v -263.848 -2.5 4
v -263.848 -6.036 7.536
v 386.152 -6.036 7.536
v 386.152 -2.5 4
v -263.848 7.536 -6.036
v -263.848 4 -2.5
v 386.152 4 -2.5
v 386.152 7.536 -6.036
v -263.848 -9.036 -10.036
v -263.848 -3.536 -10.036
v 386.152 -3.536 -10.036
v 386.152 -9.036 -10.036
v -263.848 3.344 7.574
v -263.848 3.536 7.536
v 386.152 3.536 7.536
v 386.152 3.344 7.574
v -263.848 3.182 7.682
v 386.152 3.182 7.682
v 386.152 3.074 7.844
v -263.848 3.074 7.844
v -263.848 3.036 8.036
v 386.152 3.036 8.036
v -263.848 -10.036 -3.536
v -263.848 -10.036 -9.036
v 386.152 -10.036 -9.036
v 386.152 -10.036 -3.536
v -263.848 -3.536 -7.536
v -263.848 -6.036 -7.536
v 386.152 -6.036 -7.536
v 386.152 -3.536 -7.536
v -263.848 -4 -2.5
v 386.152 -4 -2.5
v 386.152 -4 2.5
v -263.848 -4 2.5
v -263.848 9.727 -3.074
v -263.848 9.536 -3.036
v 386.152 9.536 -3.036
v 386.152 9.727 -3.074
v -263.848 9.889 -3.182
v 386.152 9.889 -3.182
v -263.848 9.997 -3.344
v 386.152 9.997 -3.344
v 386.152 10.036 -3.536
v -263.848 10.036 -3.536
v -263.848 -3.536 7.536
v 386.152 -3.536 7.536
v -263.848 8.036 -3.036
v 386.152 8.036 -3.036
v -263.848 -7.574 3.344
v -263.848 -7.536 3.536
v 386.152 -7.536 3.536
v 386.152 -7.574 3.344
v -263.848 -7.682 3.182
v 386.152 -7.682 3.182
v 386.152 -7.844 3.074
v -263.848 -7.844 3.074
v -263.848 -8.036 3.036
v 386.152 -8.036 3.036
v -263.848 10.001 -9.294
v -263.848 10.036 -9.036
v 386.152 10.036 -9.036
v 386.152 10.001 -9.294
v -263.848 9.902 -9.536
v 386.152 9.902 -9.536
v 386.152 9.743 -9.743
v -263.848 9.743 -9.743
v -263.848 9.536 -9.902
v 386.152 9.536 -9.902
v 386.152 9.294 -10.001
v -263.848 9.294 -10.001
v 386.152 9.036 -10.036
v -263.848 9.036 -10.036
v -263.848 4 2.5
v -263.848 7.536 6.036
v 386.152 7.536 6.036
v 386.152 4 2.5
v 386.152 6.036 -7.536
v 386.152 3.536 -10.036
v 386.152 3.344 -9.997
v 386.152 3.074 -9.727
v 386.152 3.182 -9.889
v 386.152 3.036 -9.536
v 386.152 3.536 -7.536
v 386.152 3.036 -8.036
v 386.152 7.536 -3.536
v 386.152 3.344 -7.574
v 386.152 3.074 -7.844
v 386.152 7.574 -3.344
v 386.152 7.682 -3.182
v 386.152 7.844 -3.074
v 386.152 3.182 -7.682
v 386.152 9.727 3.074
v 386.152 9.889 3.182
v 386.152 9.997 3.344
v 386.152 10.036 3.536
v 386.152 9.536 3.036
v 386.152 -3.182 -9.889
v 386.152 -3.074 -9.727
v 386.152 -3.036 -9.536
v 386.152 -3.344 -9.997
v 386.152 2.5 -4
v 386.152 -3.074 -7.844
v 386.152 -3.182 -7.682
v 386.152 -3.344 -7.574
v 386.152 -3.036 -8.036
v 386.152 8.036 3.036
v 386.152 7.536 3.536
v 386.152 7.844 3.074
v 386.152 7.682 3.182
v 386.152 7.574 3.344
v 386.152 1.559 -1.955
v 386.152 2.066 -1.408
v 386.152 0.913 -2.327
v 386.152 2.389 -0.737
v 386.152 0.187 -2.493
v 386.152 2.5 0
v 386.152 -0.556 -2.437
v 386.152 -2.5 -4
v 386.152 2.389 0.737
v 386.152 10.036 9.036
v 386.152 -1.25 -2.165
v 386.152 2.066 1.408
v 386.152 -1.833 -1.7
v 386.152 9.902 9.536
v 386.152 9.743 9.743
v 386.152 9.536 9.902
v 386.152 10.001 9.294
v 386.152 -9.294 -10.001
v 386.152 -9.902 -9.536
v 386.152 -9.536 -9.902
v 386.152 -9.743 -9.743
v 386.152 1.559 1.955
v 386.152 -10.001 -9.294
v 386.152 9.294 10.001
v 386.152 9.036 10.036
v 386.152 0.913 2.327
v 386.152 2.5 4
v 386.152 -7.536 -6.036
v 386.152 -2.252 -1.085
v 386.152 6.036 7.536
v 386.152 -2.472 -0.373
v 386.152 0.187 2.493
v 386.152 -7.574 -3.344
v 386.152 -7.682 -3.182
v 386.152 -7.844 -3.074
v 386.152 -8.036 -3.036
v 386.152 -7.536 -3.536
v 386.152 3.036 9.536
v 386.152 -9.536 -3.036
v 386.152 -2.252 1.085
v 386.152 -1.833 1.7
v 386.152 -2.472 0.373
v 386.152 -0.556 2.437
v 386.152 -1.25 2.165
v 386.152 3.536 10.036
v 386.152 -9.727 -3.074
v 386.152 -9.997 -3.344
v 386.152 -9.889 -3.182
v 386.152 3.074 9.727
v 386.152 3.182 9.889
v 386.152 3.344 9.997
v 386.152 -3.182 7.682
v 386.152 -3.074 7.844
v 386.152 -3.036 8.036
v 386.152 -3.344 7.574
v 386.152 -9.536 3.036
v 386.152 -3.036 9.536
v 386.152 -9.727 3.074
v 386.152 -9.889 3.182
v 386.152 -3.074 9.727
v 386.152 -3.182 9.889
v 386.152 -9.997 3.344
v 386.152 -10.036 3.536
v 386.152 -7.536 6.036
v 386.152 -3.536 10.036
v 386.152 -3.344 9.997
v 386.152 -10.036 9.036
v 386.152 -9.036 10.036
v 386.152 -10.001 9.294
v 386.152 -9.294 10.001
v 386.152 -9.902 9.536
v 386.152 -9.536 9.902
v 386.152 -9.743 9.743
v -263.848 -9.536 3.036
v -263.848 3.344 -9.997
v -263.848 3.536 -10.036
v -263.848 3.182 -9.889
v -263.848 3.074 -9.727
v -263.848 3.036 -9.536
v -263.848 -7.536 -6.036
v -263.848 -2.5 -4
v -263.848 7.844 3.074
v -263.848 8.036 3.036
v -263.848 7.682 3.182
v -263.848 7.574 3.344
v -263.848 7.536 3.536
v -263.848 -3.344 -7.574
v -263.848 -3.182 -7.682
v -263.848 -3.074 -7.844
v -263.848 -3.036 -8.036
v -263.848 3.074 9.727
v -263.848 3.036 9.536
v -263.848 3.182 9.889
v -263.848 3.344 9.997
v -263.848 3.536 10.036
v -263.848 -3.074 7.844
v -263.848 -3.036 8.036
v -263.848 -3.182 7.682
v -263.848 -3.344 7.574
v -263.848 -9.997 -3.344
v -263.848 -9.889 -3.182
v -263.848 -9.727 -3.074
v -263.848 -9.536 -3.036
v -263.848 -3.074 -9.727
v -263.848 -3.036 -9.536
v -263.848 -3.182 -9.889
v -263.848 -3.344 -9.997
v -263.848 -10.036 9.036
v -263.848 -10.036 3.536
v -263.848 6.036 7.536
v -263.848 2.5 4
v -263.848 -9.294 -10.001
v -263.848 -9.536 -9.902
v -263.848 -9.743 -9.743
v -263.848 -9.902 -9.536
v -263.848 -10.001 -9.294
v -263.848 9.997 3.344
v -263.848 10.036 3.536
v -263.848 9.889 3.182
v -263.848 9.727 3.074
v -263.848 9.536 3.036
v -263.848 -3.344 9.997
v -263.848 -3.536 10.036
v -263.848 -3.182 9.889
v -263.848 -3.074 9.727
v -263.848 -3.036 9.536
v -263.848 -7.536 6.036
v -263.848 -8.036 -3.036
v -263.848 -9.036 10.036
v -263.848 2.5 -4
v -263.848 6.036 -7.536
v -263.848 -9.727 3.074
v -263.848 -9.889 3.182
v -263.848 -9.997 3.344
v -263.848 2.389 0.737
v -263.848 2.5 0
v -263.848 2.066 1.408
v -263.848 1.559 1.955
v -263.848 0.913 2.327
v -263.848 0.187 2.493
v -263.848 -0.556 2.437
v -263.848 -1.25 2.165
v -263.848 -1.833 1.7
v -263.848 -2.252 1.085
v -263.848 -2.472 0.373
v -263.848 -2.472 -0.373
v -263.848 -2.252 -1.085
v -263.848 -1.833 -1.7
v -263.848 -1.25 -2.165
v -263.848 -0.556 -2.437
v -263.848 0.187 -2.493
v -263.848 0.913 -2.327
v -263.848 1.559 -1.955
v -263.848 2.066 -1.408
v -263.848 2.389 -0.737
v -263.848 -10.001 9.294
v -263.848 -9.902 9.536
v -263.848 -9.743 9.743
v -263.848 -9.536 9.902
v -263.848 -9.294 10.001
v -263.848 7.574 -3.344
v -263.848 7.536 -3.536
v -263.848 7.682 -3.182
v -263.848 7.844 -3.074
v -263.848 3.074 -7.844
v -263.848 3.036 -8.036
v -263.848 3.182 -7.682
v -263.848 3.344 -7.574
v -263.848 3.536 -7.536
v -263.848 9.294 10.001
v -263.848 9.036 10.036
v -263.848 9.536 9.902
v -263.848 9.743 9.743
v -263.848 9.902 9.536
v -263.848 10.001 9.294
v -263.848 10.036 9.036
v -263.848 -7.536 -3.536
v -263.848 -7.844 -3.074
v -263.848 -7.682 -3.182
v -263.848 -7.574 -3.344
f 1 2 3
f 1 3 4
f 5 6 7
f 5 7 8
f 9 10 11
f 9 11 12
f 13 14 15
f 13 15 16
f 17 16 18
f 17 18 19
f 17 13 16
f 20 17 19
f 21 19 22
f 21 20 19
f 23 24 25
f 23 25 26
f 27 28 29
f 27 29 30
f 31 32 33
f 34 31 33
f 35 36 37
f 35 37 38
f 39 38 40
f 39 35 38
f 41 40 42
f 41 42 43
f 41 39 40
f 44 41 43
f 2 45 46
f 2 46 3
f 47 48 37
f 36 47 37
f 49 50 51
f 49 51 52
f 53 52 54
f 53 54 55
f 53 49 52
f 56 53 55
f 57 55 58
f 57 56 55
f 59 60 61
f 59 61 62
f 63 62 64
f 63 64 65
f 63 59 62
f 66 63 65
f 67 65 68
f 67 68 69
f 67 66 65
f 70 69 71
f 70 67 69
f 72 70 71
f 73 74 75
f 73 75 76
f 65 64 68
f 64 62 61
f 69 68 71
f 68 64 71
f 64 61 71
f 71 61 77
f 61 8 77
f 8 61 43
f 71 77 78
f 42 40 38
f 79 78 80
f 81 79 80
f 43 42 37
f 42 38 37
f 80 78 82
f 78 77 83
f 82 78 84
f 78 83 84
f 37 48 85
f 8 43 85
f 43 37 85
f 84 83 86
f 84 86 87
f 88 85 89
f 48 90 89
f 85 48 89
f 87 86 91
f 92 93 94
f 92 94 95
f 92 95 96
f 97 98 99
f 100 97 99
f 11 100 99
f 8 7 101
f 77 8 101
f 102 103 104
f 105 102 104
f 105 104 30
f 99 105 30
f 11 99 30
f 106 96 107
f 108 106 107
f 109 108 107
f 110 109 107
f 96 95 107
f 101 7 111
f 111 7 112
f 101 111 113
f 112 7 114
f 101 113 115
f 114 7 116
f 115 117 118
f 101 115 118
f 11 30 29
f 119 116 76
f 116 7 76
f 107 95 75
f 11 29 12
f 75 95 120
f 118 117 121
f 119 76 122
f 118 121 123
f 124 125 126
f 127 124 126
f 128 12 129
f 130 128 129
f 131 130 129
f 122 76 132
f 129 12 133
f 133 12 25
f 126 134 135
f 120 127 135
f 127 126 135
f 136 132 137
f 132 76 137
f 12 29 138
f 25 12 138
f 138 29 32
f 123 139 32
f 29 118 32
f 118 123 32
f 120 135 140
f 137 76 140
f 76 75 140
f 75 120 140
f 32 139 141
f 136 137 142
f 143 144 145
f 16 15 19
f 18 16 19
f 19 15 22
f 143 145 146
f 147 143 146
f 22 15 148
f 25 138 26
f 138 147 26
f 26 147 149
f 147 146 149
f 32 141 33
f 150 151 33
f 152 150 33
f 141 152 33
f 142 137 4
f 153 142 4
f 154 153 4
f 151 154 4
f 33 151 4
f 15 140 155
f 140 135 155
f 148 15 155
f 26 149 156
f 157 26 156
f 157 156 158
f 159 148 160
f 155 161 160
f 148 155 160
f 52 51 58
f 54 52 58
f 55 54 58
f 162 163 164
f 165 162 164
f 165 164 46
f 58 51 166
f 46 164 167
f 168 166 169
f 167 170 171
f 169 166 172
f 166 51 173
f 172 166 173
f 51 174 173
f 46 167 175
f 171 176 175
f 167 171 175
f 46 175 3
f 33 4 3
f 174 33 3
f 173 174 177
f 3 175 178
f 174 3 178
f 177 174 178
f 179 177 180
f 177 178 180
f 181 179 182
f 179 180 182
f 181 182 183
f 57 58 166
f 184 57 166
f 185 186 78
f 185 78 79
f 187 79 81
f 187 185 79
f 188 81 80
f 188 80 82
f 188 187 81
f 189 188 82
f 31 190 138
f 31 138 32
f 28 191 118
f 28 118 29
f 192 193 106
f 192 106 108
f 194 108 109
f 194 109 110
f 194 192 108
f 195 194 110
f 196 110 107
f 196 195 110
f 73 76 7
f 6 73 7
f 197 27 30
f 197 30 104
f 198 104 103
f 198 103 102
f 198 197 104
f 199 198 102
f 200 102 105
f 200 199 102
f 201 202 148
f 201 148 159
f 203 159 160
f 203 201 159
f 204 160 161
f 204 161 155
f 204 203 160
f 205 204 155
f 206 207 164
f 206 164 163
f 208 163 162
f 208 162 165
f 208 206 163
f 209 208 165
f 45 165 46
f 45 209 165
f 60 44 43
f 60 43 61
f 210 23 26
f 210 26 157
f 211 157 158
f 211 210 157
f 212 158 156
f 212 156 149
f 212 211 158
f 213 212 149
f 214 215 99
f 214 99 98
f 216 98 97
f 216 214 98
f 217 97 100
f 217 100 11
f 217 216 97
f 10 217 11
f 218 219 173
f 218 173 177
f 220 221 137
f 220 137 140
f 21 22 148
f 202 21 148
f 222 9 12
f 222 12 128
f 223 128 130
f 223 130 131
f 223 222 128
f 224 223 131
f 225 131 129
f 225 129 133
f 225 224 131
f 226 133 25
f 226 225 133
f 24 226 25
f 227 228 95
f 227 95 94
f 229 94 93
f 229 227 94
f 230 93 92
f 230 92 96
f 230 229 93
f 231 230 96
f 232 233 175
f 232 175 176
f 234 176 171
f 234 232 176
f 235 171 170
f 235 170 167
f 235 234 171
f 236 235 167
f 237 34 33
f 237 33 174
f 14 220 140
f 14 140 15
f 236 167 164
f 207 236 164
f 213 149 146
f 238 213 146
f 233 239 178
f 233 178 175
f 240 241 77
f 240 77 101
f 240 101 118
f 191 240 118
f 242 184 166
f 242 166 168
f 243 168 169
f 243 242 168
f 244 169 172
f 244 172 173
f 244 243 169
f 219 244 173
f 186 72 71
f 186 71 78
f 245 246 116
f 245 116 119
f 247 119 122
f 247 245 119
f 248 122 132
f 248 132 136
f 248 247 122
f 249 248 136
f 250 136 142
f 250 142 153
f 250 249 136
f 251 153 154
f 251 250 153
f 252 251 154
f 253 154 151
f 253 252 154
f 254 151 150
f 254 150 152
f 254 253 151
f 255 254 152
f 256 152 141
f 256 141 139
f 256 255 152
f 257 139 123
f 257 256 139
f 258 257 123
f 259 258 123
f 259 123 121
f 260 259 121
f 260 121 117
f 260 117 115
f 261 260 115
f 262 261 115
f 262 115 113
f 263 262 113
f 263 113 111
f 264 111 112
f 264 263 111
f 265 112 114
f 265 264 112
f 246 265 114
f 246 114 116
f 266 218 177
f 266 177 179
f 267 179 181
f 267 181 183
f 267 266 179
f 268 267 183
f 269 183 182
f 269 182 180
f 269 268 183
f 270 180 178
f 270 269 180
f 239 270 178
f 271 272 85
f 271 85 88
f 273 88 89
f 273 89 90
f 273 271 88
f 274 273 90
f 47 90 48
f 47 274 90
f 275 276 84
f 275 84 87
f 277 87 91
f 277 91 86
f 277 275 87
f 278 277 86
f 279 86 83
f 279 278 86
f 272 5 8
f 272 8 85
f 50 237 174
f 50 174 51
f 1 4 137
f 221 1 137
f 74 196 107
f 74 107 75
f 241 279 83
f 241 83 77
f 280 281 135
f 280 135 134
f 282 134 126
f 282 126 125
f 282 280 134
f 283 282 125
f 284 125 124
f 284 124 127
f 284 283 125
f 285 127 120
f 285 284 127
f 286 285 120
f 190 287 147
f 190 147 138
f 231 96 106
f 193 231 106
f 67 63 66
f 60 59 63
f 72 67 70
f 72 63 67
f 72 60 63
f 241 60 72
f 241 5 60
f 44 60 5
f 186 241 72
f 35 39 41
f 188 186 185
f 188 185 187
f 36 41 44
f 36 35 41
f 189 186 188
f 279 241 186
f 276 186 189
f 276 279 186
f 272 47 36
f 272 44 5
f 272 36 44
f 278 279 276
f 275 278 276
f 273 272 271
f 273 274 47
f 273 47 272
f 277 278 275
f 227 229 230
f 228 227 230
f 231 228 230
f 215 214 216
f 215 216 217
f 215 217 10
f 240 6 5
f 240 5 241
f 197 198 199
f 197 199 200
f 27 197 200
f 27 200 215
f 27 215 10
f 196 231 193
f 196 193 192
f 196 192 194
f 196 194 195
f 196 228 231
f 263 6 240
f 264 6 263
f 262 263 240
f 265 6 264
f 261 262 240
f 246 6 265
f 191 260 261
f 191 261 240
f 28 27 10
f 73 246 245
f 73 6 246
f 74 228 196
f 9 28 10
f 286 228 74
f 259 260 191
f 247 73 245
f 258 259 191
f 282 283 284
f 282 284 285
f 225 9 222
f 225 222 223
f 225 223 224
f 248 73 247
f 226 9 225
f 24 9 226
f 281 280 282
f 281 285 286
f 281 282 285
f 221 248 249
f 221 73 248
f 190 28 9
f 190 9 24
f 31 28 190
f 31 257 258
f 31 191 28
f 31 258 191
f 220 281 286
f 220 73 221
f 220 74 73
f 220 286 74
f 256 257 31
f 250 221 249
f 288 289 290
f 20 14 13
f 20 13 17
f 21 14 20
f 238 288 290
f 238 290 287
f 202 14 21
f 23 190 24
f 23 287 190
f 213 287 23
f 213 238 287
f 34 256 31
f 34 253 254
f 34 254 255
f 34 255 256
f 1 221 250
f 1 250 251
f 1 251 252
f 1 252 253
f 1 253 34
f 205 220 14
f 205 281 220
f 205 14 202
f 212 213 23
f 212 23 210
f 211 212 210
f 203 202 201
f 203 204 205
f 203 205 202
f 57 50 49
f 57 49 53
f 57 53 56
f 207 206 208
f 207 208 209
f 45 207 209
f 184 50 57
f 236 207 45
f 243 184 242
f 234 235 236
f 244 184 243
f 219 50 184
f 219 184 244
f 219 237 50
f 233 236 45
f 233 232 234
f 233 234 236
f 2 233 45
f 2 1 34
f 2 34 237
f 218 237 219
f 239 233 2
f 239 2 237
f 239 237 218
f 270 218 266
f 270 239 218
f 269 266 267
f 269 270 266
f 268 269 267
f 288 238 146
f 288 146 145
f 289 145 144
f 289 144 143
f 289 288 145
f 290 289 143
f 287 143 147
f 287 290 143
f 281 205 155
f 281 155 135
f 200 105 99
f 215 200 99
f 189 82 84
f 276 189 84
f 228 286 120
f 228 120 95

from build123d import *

# Parameters (mm, degrees)
SKETCH11_R                            = 2.5
ALUMINIUM_PROF_ALUMINIUM_PROF_1_DEPTH = 650


with BuildPart() as part:
    # Sketch11 → Aluminium prof ALUMINIUM PROF(1) (new body)
    with BuildSketch(Plane.YZ.offset(-263.847780127)):
        with BuildLine():
            Line((-2.5, 4), (2.5, 4))
            Line((2.5, 4), (6.035533906, 7.535533906))
            Line((6.035533906, 7.535533906), (3.535533906, 7.535533906))
            ThreePointArc((3.535533906, 7.535533906), (3.181980515, 7.681980515), (3.035533906, 8.035533906))
            Line((3.035533906, 8.035533906), (3.035533906, 9.535533906))
            ThreePointArc((3.035533906, 9.535533906), (3.181980515, 9.889087297), (3.535533906, 10.035533906))
            Line((3.535533906, 10.035533906), (9.035533906, 10.035533906))
            ThreePointArc((9.035533906, 10.035533906), (9.742640687, 9.742640687), (10.035533906, 9.035533906))
            Line((10.035533906, 9.035533906), (10.035533906, 3.535533906))
            ThreePointArc((10.035533906, 3.535533906), (9.889087297, 3.181980515), (9.535533906, 3.035533906))
            Line((9.535533906, 3.035533906), (8.035533906, 3.035533906))
            ThreePointArc((8.035533906, 3.035533906), (7.681980515, 3.181980515), (7.535533906, 3.535533906))
            Line((7.535533906, 3.535533906), (7.535533906, 6.035533906))
            Line((7.535533906, 6.035533906), (4, 2.5))
            Line((4, 2.5), (4, -2.5))
            Line((4, -2.5), (7.535533906, -6.035533906))
            Line((7.535533906, -6.035533906), (7.535533906, -3.535533906))
            ThreePointArc((7.535533906, -3.535533906), (7.681980515, -3.181980515), (8.035533906, -3.035533906))
            Line((8.035533906, -3.035533906), (9.535533906, -3.035533906))
            ThreePointArc((9.535533906, -3.035533906), (9.889087297, -3.181980515), (10.035533906, -3.535533906))
            Line((10.035533906, -3.535533906), (10.035533906, -9.035533906))
            ThreePointArc((10.035533906, -9.035533906), (9.742640687, -9.742640687), (9.035533906, -10.035533906))
            Line((9.035533906, -10.035533906), (3.535533906, -10.035533906))
            ThreePointArc((3.535533906, -10.035533906), (3.181980515, -9.889087297), (3.035533906, -9.535533906))
            Line((3.035533906, -9.535533906), (3.035533906, -8.035533906))
            ThreePointArc((3.035533906, -8.035533906), (3.181980515, -7.681980515), (3.535533906, -7.535533906))
            Line((3.535533906, -7.535533906), (6.035533906, -7.535533906))
            Line((6.035533906, -7.535533906), (2.5, -4))
            Line((2.5, -4), (-2.5, -4))
            Line((-2.5, -4), (-6.035533906, -7.535533906))
            Line((-6.035533906, -7.535533906), (-3.535533906, -7.535533906))
            ThreePointArc((-3.535533906, -7.535533906), (-3.181980515, -7.681980515), (-3.035533906, -8.035533906))
            Line((-3.035533906, -8.035533906), (-3.035533906, -9.535533906))
            ThreePointArc((-3.035533906, -9.535533906), (-3.181980515, -9.889087297), (-3.535533906, -10.035533906))
            Line((-3.535533906, -10.035533906), (-9.035533906, -10.035533906))
            ThreePointArc((-9.035533906, -10.035533906), (-9.742640687, -9.742640687), (-10.035533906, -9.035533906))
            Line((-10.035533906, -9.035533906), (-10.035533906, -3.535533906))
            ThreePointArc((-10.035533906, -3.535533906), (-9.889087297, -3.181980515), (-9.535533906, -3.035533906))
            Line((-9.535533906, -3.035533906), (-8.035533906, -3.035533906))
            ThreePointArc((-8.035533906, -3.035533906), (-7.681980515, -3.181980515), (-7.535533906, -3.535533906))
            Line((-7.535533906, -3.535533906), (-7.535533906, -6.035533906))
            Line((-7.535533906, -6.035533906), (-4, -2.5))
            Line((-4, -2.5), (-4, 2.5))
            Line((-4, 2.5), (-7.535533906, 6.035533906))
            Line((-7.535533906, 6.035533906), (-7.535533906, 3.535533906))
            ThreePointArc((-7.535533906, 3.535533906), (-7.681980515, 3.181980515), (-8.035533906, 3.035533906))
            Line((-8.035533906, 3.035533906), (-9.535533906, 3.035533906))
            ThreePointArc((-9.535533906, 3.035533906), (-9.889087297, 3.181980515), (-10.035533906, 3.535533906))
            Line((-10.035533906, 3.535533906), (-10.035533906, 9.035533906))
            ThreePointArc((-10.035533906, 9.035533906), (-9.742640687, 9.742640687), (-9.035533906, 10.035533906))
            Line((-9.035533906, 10.035533906), (-3.535533906, 10.035533906))
            ThreePointArc((-3.535533906, 10.035533906), (-3.181980515, 9.889087297), (-3.035533906, 9.535533906))
            Line((-3.035533906, 9.535533906), (-3.035533906, 8.035533906))
            ThreePointArc((-3.035533906, 8.035533906), (-3.181980515, 7.681980515), (-3.535533906, 7.535533906))
            Line((-3.535533906, 7.535533906), (-6.035533906, 7.535533906))
            Line((-6.035533906, 7.535533906), (-2.5, 4))
        make_face()
        Circle(SKETCH11_R, mode=Mode.SUBTRACT)
    extrude(amount=ALUMINIUM_PROF_ALUMINIUM_PROF_1_DEPTH)


solid = part.part
